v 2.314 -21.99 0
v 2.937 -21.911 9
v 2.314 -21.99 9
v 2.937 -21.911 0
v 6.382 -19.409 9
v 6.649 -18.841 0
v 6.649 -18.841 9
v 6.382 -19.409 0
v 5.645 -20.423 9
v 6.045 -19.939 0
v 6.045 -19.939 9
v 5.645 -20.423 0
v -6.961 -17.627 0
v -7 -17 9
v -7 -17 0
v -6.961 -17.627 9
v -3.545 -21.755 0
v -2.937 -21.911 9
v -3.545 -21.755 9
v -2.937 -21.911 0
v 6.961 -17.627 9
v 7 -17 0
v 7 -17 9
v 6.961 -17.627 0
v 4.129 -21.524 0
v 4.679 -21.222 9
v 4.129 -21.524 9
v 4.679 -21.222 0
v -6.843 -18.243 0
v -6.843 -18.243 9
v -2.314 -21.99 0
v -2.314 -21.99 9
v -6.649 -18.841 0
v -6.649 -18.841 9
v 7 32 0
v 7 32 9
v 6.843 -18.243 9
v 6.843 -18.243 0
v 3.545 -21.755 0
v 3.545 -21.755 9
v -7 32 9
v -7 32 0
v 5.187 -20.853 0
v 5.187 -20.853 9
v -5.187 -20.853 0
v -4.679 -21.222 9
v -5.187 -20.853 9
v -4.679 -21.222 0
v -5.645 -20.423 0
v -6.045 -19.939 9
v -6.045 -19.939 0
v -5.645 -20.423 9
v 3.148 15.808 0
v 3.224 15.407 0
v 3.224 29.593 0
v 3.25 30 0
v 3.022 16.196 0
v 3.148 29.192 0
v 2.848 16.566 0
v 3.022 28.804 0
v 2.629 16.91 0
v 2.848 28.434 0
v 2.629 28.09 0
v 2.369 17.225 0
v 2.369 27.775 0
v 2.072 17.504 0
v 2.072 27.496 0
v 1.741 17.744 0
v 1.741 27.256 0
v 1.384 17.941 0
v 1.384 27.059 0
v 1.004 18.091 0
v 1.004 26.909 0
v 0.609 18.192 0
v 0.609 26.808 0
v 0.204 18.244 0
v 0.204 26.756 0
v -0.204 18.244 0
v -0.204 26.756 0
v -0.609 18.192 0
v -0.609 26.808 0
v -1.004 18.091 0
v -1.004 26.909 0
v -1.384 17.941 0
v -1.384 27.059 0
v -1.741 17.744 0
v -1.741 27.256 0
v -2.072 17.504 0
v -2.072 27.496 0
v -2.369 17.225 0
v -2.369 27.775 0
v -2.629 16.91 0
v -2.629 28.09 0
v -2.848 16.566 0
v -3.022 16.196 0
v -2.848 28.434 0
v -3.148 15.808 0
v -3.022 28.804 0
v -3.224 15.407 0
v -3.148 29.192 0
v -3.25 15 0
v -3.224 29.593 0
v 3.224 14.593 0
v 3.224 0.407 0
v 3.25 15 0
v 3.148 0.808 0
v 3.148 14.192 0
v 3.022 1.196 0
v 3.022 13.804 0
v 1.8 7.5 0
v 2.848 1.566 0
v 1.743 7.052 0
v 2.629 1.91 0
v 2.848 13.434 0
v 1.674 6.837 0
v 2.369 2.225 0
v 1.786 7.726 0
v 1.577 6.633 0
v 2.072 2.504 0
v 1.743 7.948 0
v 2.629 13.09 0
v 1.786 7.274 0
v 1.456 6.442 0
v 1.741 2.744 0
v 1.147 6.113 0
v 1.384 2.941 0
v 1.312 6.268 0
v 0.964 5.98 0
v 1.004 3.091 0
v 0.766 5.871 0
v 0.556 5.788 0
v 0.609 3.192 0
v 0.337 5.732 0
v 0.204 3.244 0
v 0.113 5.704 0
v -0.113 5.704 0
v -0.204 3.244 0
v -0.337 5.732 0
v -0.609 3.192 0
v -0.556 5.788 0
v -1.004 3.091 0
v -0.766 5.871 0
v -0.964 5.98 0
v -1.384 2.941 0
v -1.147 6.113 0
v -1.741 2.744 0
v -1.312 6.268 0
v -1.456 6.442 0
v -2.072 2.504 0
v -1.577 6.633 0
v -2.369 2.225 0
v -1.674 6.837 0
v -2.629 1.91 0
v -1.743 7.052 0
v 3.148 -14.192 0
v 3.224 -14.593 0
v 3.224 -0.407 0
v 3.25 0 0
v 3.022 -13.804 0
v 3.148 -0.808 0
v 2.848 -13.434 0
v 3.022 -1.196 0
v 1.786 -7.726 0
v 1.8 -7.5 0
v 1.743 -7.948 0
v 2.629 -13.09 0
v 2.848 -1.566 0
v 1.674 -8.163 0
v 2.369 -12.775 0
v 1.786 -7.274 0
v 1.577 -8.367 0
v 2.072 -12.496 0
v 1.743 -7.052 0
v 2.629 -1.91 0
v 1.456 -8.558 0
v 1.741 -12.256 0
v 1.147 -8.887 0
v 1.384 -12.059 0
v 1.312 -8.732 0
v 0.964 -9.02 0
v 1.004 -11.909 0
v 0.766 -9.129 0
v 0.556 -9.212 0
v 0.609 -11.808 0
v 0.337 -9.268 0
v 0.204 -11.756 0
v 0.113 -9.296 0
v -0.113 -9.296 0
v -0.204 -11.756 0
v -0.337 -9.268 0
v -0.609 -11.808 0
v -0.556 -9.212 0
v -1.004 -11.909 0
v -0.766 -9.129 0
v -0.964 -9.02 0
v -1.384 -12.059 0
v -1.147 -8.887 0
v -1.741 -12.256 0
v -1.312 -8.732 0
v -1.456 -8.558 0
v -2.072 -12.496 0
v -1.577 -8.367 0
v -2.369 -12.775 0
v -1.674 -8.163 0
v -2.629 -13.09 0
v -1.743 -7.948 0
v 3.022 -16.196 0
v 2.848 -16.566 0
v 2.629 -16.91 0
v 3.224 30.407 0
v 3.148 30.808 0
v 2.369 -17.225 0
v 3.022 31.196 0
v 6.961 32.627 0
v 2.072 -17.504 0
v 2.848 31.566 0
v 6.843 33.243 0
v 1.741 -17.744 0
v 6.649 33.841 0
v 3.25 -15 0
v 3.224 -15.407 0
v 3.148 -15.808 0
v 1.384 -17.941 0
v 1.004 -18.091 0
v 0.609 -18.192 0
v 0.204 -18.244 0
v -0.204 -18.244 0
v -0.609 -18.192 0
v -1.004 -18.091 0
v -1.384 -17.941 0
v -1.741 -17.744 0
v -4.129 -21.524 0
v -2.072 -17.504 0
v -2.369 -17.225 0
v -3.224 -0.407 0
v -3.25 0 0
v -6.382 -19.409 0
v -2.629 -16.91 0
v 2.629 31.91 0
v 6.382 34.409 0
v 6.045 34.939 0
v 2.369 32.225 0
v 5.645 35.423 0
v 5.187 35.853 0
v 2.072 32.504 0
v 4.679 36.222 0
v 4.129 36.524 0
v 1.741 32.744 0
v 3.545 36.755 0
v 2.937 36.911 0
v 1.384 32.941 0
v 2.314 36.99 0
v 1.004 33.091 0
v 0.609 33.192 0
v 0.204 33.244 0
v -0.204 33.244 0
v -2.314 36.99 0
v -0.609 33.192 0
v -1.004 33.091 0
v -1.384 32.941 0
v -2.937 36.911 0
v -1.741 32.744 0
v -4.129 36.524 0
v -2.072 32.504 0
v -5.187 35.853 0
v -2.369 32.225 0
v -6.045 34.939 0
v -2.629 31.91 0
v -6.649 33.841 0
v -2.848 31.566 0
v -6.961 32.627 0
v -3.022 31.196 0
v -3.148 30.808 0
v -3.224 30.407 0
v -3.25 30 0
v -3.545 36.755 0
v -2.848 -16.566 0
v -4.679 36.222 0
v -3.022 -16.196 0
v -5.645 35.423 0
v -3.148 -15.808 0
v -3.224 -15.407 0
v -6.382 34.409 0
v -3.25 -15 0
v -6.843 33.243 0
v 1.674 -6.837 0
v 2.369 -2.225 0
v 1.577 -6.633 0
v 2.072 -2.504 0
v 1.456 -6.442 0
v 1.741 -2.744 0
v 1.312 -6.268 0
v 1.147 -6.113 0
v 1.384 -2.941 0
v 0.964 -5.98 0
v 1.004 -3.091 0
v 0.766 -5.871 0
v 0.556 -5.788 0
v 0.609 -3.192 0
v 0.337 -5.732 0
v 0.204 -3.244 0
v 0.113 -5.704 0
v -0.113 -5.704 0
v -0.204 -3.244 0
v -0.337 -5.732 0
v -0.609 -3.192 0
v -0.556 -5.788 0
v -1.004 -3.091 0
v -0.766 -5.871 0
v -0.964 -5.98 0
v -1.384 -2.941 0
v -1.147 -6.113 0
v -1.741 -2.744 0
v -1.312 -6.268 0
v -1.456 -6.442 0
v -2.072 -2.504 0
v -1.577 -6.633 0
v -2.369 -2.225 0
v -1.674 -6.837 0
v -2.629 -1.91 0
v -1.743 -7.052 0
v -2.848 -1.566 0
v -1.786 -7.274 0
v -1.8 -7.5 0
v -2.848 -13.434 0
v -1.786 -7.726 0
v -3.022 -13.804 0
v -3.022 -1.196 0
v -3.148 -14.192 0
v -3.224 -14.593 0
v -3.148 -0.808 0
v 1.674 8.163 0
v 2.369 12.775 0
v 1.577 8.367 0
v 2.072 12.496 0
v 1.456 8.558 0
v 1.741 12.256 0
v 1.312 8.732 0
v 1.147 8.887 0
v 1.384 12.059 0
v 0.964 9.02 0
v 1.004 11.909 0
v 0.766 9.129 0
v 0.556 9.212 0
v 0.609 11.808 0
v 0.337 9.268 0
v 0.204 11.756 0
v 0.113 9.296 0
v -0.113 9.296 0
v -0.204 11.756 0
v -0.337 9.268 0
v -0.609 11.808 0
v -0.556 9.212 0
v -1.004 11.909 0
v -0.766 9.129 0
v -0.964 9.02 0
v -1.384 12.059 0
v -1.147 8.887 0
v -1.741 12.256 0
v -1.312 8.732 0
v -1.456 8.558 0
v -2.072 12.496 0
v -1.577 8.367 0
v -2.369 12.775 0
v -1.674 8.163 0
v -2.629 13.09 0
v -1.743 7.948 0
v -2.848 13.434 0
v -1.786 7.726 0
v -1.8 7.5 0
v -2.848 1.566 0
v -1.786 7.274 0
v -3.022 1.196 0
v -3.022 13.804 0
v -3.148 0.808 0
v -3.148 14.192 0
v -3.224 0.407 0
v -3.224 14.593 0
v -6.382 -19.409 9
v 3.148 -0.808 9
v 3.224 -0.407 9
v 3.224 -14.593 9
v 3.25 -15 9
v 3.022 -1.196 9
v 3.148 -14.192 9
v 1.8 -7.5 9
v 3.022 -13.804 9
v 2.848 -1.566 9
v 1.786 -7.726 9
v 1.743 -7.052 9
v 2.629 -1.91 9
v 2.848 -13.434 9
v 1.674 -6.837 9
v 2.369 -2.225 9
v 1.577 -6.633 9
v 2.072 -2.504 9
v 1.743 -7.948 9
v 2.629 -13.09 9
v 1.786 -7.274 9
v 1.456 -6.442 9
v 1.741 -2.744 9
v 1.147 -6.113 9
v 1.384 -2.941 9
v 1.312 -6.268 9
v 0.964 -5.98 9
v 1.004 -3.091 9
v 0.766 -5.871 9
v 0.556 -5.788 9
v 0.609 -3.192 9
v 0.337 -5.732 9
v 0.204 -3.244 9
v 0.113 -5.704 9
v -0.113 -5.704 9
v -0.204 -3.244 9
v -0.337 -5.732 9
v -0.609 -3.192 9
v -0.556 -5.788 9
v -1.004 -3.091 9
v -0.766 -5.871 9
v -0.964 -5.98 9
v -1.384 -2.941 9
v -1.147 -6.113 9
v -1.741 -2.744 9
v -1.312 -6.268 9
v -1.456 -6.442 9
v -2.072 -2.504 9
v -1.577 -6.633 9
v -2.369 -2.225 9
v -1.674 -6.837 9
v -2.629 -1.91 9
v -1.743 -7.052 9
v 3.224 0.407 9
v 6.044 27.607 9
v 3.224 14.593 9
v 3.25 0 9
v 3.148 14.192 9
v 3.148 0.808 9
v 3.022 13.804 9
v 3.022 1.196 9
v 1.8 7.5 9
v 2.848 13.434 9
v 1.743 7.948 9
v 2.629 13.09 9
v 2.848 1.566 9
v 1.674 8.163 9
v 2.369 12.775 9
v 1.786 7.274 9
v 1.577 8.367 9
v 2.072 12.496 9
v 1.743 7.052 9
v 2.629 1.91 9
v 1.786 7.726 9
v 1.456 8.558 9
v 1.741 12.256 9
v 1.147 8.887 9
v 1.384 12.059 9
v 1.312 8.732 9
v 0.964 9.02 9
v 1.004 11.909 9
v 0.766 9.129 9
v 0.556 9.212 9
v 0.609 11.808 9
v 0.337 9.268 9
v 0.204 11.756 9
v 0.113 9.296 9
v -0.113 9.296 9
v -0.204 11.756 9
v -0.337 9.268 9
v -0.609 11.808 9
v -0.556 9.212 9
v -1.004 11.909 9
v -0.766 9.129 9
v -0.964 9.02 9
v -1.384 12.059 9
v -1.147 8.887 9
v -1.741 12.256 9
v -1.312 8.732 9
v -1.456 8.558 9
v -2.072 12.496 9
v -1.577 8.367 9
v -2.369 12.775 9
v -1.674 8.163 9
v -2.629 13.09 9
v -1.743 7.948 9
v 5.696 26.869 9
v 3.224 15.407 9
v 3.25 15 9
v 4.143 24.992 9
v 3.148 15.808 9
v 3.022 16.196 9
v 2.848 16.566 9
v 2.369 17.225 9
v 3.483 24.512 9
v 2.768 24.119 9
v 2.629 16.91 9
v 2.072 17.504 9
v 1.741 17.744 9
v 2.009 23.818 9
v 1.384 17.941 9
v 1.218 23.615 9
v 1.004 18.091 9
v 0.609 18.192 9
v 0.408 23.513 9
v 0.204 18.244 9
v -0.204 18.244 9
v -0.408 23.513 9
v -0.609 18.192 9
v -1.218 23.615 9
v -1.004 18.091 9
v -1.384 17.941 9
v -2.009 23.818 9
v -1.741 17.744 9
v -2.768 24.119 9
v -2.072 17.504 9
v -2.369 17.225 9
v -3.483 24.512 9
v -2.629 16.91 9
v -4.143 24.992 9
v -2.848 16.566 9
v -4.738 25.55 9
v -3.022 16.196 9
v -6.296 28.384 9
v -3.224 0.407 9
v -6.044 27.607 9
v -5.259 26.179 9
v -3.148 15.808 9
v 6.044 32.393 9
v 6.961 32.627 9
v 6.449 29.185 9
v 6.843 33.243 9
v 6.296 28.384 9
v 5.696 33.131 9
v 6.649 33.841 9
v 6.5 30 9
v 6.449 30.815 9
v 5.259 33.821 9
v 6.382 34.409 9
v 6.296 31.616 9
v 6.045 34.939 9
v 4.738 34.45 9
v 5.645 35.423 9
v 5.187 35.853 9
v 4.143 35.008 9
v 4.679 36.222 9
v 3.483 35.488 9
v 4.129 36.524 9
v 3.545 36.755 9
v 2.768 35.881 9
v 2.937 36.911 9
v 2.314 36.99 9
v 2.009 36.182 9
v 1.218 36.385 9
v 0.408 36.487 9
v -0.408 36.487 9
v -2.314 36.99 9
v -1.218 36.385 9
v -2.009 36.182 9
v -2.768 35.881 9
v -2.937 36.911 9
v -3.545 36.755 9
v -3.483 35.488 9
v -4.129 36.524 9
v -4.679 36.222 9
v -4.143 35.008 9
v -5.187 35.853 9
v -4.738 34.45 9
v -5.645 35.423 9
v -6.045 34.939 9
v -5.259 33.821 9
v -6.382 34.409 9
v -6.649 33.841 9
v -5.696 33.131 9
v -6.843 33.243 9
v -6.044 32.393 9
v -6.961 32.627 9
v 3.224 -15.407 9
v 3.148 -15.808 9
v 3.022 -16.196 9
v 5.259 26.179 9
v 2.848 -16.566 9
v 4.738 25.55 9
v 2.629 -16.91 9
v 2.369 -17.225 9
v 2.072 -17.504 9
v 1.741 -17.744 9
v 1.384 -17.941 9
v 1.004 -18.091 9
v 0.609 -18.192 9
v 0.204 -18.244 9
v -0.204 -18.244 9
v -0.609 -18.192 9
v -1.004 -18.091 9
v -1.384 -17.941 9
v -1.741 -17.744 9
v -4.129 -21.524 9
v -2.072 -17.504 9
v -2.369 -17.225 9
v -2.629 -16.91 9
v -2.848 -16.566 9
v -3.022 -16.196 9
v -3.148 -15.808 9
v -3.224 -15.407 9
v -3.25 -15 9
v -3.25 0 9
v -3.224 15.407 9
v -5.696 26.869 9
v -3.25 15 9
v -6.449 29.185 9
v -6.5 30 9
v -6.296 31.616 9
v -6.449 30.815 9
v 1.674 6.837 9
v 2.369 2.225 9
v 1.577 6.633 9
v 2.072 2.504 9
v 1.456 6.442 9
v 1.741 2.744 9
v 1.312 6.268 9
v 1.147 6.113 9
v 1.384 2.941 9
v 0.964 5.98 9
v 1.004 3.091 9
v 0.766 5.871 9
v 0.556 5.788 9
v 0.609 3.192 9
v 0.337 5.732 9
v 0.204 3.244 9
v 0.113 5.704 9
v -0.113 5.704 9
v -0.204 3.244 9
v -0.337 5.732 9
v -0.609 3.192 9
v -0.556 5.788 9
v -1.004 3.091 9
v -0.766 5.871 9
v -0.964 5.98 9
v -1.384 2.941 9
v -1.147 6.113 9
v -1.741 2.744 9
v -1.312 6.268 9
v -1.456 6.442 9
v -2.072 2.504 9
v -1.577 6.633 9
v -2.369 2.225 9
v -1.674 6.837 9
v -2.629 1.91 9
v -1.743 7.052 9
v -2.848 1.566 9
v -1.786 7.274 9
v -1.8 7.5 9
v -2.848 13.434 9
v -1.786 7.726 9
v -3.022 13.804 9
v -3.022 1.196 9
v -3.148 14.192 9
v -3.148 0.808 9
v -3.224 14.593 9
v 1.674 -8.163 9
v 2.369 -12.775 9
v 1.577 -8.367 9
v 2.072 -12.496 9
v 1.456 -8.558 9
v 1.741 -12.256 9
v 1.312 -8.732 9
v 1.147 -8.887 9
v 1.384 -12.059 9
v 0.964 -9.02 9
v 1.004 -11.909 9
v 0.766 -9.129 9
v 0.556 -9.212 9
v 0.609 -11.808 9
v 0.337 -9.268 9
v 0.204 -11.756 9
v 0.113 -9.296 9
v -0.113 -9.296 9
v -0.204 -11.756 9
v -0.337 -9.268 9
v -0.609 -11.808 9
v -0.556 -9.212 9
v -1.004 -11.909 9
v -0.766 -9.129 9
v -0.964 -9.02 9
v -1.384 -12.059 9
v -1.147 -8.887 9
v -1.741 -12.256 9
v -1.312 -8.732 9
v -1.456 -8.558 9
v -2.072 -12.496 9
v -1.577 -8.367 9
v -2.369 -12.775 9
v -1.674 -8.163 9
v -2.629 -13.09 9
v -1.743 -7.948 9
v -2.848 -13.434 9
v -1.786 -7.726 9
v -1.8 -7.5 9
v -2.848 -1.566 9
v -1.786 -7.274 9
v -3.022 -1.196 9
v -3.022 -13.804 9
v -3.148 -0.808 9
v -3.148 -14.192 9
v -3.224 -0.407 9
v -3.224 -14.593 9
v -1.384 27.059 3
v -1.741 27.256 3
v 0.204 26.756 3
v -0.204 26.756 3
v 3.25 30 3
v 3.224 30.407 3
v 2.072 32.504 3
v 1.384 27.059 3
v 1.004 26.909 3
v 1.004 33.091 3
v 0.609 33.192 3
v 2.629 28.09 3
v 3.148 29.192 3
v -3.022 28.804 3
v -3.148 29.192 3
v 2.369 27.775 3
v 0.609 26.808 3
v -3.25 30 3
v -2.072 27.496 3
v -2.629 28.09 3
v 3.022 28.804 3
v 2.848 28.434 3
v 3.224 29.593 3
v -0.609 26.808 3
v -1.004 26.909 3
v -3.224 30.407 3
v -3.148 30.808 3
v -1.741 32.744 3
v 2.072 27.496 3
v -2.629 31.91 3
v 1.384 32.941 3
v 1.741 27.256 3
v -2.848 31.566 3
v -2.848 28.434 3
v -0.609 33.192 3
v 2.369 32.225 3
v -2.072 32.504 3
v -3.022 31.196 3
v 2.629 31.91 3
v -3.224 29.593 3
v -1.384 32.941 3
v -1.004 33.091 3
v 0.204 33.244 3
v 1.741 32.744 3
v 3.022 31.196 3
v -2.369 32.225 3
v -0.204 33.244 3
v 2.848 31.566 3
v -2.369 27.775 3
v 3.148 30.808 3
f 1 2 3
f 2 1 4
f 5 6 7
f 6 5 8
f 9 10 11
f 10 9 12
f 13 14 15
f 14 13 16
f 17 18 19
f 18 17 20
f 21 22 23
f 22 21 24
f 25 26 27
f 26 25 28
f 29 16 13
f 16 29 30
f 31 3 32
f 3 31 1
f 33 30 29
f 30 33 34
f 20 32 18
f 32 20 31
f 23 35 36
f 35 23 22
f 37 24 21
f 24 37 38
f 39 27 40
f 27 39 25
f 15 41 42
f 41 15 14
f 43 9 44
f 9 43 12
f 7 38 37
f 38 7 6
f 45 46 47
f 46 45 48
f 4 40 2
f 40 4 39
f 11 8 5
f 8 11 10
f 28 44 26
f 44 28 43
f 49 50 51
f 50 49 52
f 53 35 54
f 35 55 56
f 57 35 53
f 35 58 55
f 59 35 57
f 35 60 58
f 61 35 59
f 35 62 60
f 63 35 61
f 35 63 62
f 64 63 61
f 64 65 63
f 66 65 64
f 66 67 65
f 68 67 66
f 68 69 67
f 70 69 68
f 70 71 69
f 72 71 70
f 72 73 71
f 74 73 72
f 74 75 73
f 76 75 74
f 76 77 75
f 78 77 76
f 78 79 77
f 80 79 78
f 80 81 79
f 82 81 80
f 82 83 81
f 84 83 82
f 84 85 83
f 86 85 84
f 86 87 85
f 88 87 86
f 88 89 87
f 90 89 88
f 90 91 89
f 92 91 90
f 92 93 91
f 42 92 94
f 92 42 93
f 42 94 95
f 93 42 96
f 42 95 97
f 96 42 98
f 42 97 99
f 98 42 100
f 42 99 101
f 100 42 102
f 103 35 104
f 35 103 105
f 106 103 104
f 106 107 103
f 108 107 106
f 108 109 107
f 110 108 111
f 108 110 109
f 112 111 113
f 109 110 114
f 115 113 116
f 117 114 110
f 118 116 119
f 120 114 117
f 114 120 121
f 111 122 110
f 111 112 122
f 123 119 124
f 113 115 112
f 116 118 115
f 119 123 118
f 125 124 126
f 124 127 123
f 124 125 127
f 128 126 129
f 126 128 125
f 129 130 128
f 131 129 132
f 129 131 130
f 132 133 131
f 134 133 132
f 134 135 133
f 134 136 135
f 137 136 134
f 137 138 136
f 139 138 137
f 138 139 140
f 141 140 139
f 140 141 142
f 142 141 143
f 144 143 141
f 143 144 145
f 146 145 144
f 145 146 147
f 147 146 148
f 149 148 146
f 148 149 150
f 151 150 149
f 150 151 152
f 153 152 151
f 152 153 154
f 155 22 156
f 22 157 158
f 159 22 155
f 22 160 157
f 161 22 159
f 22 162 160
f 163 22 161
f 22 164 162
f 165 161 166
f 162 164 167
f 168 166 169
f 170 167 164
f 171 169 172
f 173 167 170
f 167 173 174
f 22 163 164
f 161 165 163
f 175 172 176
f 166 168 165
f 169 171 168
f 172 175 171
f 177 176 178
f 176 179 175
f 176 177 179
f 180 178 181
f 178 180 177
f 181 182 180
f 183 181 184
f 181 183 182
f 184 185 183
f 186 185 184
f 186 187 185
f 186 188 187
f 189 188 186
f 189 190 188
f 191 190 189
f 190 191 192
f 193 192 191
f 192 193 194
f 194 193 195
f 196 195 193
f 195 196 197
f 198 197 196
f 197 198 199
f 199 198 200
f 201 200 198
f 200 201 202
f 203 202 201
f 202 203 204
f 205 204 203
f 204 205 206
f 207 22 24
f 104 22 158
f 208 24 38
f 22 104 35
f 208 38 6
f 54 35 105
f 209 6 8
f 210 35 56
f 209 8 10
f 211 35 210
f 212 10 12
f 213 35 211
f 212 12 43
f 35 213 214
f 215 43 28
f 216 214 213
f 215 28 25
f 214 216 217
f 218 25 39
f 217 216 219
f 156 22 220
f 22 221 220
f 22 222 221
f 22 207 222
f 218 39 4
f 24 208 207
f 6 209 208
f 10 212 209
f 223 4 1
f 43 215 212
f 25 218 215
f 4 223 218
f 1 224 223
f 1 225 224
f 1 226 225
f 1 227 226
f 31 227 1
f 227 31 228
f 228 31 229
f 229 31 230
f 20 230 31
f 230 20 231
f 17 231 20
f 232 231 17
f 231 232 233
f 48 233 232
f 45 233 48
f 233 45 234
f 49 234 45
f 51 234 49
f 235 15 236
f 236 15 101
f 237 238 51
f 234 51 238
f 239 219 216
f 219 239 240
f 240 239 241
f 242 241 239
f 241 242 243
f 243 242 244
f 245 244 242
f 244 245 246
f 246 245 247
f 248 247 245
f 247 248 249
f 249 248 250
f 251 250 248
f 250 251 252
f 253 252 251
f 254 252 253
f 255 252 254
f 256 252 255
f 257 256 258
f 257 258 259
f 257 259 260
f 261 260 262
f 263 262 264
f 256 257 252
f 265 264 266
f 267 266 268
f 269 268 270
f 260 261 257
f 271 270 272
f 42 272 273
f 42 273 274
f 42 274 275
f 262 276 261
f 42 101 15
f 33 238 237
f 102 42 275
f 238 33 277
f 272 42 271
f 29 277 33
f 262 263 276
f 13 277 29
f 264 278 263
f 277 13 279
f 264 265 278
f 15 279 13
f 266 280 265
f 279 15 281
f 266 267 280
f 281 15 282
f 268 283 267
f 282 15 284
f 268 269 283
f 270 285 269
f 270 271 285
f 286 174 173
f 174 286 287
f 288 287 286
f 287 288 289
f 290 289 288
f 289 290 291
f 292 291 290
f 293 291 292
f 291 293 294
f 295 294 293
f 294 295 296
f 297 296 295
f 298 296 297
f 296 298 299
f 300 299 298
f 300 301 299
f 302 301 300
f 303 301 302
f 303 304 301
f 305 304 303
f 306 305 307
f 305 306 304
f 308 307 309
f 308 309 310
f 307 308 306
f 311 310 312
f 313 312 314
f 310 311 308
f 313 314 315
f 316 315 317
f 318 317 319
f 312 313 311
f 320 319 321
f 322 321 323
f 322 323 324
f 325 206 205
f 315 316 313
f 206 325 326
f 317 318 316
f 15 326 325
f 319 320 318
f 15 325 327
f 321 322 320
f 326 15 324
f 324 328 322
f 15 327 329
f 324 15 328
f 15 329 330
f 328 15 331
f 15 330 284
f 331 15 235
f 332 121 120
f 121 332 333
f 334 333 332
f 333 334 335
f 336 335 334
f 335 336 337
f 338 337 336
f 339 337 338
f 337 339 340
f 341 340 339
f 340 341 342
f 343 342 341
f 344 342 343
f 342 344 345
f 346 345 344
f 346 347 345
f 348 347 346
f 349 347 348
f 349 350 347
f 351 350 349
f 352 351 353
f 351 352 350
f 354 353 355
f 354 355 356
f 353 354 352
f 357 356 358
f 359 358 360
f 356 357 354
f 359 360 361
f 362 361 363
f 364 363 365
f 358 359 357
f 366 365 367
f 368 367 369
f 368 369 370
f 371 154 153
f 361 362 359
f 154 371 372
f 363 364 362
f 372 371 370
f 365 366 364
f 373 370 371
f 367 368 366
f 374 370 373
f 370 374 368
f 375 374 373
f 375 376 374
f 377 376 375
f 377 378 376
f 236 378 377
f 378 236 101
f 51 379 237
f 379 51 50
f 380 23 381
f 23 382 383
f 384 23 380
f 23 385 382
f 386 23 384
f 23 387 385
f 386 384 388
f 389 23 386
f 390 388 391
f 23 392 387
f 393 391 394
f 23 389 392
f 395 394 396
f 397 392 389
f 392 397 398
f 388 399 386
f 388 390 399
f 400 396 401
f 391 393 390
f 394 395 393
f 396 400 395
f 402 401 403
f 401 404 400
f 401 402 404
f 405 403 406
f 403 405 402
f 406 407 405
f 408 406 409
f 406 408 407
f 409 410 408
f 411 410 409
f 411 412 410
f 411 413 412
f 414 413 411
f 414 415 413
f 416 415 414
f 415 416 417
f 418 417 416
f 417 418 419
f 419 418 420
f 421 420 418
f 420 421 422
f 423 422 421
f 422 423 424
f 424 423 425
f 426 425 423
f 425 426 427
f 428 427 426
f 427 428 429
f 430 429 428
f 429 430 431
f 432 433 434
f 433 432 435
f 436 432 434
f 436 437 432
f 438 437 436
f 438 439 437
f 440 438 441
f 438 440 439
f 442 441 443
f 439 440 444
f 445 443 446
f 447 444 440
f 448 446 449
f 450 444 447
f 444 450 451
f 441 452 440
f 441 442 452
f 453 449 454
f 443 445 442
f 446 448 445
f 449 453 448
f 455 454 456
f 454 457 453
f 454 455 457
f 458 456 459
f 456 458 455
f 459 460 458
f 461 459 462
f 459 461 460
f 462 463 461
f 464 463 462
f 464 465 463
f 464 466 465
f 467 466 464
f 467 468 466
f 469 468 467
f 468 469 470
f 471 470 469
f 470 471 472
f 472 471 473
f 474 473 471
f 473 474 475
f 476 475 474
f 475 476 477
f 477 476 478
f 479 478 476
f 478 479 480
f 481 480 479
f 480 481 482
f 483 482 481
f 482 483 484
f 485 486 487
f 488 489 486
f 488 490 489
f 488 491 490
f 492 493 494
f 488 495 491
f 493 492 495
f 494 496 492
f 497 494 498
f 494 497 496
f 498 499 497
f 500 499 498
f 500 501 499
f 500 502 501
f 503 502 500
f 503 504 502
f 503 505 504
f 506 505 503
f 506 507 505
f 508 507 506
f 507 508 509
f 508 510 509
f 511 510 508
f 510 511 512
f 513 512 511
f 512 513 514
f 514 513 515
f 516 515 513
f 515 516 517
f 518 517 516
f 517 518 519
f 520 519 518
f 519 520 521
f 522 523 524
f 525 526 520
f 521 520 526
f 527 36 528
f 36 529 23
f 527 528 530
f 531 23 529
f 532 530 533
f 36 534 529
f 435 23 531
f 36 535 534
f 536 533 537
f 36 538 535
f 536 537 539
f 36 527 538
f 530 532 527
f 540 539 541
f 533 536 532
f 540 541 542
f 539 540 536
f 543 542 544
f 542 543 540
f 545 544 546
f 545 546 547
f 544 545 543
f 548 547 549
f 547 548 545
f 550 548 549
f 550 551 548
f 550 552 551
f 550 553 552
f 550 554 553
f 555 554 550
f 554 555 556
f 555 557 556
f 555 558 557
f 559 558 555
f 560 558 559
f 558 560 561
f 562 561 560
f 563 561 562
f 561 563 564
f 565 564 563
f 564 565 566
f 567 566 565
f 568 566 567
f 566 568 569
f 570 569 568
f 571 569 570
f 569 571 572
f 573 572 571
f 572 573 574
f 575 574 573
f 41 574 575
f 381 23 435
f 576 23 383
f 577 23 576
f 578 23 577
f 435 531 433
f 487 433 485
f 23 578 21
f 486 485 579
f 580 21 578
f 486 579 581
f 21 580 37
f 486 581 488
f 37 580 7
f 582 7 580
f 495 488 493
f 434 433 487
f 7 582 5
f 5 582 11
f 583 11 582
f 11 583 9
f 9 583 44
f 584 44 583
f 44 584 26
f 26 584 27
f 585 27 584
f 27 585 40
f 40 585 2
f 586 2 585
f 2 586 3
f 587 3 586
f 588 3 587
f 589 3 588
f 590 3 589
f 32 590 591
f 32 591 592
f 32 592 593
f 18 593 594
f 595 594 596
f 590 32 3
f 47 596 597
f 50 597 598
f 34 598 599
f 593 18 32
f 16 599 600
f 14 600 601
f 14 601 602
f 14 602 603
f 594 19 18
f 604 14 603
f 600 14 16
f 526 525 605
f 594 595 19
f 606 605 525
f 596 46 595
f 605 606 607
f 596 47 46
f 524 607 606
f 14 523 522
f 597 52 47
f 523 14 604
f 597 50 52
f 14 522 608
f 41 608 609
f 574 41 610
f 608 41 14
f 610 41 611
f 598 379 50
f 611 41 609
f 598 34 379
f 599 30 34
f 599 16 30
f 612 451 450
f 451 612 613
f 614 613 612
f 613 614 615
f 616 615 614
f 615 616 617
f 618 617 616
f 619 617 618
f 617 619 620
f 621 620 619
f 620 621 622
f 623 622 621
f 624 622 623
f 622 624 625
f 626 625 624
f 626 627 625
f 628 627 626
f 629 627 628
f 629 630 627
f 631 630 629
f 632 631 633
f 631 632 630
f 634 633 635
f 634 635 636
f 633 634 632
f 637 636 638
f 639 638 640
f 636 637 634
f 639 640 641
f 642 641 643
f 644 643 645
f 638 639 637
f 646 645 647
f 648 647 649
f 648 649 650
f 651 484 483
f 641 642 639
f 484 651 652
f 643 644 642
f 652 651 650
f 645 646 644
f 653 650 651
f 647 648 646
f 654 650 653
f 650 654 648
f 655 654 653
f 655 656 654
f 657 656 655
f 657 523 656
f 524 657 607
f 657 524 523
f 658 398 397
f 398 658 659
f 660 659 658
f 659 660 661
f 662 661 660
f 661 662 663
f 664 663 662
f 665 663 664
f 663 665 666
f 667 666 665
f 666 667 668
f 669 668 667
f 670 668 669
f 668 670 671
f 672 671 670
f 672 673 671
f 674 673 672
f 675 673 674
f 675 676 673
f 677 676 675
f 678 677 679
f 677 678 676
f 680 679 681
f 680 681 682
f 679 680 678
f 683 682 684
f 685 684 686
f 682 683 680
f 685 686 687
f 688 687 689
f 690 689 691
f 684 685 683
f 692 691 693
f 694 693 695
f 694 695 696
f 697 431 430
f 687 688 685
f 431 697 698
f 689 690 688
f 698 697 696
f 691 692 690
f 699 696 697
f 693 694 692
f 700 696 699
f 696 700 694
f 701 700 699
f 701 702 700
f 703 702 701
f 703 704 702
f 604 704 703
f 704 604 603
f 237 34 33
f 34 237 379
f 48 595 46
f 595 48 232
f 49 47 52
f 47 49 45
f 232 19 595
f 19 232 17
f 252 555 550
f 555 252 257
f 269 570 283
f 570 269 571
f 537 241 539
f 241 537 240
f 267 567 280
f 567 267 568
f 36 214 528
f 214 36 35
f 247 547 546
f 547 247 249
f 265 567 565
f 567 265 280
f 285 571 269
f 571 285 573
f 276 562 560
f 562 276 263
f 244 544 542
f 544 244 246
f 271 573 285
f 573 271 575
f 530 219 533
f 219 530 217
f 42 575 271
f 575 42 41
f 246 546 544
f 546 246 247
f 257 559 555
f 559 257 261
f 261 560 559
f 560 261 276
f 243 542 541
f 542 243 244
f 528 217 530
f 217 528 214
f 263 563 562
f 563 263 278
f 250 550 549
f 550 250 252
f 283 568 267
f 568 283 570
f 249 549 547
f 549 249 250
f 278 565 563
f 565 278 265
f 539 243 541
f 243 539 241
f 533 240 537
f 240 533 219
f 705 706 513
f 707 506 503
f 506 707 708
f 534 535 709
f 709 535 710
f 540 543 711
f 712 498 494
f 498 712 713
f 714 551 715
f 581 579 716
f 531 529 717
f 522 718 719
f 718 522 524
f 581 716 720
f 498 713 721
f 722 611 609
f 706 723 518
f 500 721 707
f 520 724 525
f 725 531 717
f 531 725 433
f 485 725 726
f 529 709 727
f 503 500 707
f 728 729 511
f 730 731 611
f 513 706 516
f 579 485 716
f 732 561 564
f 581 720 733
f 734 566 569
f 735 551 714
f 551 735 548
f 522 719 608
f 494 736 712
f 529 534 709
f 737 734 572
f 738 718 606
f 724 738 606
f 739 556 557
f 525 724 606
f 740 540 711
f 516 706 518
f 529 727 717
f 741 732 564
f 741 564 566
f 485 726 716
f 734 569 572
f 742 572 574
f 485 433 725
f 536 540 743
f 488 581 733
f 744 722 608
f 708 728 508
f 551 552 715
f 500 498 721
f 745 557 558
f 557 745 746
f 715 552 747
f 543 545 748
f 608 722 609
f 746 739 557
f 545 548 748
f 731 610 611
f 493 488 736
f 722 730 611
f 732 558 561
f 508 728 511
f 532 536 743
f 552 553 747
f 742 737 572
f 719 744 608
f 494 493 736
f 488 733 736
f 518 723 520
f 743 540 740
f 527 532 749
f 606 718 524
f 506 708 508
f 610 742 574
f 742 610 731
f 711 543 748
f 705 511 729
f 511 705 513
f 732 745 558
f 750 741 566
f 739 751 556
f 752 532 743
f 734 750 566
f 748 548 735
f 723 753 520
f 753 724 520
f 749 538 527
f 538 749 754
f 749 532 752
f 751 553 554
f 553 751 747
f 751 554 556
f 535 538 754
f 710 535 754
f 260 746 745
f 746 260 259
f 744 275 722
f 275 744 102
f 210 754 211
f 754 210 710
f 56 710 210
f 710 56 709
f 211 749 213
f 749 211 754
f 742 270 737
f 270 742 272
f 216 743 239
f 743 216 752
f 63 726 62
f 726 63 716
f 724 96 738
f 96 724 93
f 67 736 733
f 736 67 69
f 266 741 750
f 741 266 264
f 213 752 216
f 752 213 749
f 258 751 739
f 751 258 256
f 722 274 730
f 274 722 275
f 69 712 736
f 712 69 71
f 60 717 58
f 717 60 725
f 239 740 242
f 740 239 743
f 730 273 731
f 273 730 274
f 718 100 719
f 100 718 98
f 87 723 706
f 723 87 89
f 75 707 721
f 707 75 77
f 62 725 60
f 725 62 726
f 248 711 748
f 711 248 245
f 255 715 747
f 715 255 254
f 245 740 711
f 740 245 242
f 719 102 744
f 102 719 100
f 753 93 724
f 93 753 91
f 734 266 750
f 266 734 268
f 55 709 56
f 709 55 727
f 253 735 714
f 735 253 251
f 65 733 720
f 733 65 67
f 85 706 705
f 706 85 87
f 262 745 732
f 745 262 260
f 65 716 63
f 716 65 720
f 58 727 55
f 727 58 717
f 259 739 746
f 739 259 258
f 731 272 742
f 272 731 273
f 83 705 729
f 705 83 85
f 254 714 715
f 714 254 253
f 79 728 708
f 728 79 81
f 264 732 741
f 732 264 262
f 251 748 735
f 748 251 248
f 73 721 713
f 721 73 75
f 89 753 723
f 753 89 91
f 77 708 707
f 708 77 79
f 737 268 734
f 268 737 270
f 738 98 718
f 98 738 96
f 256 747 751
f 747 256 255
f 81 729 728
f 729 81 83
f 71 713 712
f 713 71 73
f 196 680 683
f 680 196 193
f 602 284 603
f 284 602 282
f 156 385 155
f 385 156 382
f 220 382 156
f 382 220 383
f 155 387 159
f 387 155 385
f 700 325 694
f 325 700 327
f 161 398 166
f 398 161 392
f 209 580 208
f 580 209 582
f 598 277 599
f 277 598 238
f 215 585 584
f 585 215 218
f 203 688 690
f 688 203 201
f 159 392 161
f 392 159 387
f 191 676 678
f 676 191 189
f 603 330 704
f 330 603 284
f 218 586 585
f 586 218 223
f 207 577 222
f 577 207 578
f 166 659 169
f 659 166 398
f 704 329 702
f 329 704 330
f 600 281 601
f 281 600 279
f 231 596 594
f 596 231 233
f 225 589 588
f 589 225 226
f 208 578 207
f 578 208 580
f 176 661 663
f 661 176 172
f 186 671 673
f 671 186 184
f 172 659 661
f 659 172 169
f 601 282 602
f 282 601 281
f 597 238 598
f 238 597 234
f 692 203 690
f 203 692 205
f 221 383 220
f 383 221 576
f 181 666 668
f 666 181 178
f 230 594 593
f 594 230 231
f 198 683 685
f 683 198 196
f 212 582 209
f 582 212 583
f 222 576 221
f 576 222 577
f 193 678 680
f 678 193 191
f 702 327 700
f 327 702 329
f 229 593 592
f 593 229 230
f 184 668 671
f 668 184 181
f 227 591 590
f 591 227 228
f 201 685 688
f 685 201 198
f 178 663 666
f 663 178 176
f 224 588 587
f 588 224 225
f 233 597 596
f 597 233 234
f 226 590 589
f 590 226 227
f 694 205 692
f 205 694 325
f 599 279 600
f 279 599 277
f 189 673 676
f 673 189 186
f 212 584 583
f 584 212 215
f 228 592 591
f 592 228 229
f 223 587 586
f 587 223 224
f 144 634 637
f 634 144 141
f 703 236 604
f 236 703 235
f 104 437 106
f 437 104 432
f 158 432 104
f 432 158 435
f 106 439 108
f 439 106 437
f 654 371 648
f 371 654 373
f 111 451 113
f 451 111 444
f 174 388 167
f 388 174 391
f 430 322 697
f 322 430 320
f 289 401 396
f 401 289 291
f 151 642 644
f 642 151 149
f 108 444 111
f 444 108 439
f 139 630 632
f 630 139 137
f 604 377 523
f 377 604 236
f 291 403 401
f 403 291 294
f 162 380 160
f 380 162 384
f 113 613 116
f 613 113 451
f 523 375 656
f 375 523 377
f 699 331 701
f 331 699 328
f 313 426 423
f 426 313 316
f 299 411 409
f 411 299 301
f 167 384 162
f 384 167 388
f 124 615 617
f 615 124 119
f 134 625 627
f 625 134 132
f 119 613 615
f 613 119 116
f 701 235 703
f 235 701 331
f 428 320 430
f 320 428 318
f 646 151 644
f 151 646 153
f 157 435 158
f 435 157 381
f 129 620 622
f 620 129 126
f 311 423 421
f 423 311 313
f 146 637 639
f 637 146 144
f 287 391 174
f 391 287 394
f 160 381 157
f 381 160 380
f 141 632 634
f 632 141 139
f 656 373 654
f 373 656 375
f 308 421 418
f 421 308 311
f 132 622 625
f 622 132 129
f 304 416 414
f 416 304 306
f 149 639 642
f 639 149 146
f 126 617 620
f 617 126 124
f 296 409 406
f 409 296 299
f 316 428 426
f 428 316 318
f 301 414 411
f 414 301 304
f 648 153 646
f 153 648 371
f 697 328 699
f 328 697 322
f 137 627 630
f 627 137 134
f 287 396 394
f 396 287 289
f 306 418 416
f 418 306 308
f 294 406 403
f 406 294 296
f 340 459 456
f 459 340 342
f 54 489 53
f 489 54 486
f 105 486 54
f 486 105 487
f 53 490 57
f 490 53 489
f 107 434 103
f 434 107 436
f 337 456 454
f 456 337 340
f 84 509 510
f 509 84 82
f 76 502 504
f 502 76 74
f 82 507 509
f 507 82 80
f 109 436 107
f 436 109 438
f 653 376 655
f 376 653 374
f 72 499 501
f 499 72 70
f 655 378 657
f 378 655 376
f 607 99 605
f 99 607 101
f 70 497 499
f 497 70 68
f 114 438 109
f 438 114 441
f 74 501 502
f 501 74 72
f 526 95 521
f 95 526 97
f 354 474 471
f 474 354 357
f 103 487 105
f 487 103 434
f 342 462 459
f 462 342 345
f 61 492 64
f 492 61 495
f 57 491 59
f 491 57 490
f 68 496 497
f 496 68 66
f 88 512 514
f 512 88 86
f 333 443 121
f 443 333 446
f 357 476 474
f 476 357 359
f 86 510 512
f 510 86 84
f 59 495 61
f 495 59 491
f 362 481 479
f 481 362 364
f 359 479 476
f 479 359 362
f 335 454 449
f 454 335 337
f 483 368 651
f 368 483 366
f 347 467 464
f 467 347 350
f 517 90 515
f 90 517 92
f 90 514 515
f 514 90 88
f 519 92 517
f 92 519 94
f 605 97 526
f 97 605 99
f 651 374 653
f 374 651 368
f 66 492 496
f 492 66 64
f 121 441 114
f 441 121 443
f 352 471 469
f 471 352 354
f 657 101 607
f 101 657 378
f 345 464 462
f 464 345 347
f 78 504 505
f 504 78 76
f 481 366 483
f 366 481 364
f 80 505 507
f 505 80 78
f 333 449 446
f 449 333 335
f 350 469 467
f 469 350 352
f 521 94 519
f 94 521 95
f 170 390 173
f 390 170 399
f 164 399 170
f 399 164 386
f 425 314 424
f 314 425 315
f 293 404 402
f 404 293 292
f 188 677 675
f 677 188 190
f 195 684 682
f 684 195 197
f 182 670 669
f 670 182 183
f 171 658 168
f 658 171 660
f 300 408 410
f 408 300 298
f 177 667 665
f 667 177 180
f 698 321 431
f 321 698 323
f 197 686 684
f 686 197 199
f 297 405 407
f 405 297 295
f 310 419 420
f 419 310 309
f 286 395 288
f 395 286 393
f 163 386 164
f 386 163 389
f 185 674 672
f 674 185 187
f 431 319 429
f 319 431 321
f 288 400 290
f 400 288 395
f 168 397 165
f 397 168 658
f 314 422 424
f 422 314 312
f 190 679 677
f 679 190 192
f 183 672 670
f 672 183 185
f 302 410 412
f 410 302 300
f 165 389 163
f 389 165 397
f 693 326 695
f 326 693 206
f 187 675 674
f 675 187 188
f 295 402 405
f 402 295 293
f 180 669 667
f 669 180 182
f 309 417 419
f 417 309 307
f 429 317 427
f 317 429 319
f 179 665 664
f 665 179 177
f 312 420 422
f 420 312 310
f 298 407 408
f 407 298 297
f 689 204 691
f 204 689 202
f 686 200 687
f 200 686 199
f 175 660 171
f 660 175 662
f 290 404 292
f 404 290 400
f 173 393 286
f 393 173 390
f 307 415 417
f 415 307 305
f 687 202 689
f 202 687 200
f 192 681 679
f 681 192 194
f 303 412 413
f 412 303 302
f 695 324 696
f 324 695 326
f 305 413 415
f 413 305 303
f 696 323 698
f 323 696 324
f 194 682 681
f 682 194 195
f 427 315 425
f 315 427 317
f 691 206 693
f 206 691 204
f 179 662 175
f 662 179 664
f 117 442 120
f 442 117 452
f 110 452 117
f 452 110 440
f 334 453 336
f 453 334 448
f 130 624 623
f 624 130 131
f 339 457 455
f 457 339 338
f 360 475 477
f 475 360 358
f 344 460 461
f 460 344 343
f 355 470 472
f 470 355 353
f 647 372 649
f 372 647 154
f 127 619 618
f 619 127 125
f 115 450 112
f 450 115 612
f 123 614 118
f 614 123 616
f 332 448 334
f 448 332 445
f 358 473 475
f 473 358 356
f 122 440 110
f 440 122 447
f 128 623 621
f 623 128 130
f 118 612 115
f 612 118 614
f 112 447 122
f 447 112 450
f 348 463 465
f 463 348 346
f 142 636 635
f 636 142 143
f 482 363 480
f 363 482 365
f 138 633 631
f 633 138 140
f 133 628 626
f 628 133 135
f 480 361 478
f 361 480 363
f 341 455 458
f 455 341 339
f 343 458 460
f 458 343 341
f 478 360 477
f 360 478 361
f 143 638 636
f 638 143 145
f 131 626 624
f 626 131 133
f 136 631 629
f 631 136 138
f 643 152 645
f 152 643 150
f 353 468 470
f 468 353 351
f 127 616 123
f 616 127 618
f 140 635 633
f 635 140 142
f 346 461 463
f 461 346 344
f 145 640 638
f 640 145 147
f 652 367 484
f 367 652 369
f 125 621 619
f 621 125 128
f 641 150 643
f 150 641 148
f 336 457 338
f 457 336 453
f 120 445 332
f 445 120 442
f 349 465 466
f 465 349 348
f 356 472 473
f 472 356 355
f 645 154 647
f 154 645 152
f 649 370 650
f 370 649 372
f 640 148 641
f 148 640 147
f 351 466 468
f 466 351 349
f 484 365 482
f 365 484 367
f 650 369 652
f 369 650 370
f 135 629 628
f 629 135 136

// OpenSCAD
$fn = 50;


difference() {
	union() {
		hull() {
			translate(v = [-2.0000000000, 17.0000000000, 0]) {
				cylinder(h = 9, r = 5);
			}
			translate(v = [2.0000000000, 17.0000000000, 0]) {
				cylinder(h = 9, r = 5);
			}
			translate(v = [-2.0000000000, -17.0000000000, 0]) {
				cylinder(h = 9, r = 5);
			}
			translate(v = [2.0000000000, -17.0000000000, 0]) {
				cylinder(h = 9, r = 5);
			}
		}
		translate(v = [0.0000000000, 22.5000000000, 0]) {
			hull() {
				translate(v = [-2.0000000000, 9.5000000000, 0]) {
					cylinder(h = 9, r = 5);
				}
				translate(v = [2.0000000000, 9.5000000000, 0]) {
					cylinder(h = 9, r = 5);
				}
				translate(v = [-2.0000000000, -9.5000000000, 0]) {
					cylinder(h = 9, r = 5);
				}
				translate(v = [2.0000000000, -9.5000000000, 0]) {
					cylinder(h = 9, r = 5);
				}
			}
		}
		translate(v = [0.0000000000, 22.5000000000, 0]) {
			hull() {
				translate(v = [-2.0000000000, 9.5000000000, 0]) {
					cylinder(h = 9, r = 5);
				}
				translate(v = [2.0000000000, 9.5000000000, 0]) {
					cylinder(h = 9, r = 5);
				}
				translate(v = [-2.0000000000, -9.5000000000, 0]) {
					cylinder(h = 9, r = 5);
				}
				translate(v = [2.0000000000, -9.5000000000, 0]) {
					cylinder(h = 9, r = 5);
				}
			}
		}
	}
	union() {
		translate(v = [0.0000000000, 30.0000000000, 9]) {
			rotate(a = [0, 0, 0]) {
				difference() {
					union() {
						#translate(v = [0, 0, -9.0000000000]) {
							cylinder(h = 9, r = 2.2500000000);
						}
						#translate(v = [0, 0, -6]) {
							cylinder(h = 6, r1 = 3.2500000000, r2 = 6.5000000000);
						}
						#translate(v = [0, 0, -9.0000000000]) {
							cylinder(h = 9, r = 3.2500000000);
						}
						#translate(v = [0, 0, -9.0000000000]) {
							cylinder(h = 9, r = 2.2500000000);
						}
					}
					union();
				}
			}
		}
		translate(v = [0.0000000000, 30.0000000000, 9]) {
			rotate(a = [0, 0, 0]) {
				difference() {
					union() {
						#translate(v = [0, 0, -9.0000000000]) {
							cylinder(h = 9, r = 2.2500000000);
						}
						#translate(v = [0, 0, -6]) {
							cylinder(h = 6, r1 = 3.2500000000, r2 = 6.5000000000);
						}
						#translate(v = [0, 0, -9.0000000000]) {
							cylinder(h = 9, r = 3.2500000000);
						}
						#translate(v = [0, 0, -9.0000000000]) {
							cylinder(h = 9, r = 2.2500000000);
						}
					}
					union();
				}
			}
		}
		translate(v = [0.0000000000, -15.0000000000, 0]) {
			translate(v = [0, 0, -100]) {
				cylinder(h = 200, r = 3.2500000000);
			}
		}
		translate(v = [0, 0, -100]) {
			cylinder(h = 200, r = 3.2500000000);
		}
		translate(v = [0.0000000000, 15.0000000000, 0]) {
			translate(v = [0, 0, -100]) {
				cylinder(h = 200, r = 3.2500000000);
			}
		}
		translate(v = [0.0000000000, -15.0000000000, 0]) {
			translate(v = [0, 0, -100]) {
				cylinder(h = 200, r = 1.8000000000);
			}
		}
		translate(v = [0.0000000000, -7.5000000000, 0]) {
			translate(v = [0, 0, -100]) {
				cylinder(h = 200, r = 1.8000000000);
			}
		}
		translate(v = [0, 0, -100]) {
			cylinder(h = 200, r = 1.8000000000);
		}
		translate(v = [0.0000000000, 7.5000000000, 0]) {
			translate(v = [0, 0, -100]) {
				cylinder(h = 200, r = 1.8000000000);
			}
		}
		translate(v = [0.0000000000, 15.0000000000, 0]) {
			translate(v = [0, 0, -100]) {
				cylinder(h = 200, r = 1.8000000000);
			}
		}
	}
}
